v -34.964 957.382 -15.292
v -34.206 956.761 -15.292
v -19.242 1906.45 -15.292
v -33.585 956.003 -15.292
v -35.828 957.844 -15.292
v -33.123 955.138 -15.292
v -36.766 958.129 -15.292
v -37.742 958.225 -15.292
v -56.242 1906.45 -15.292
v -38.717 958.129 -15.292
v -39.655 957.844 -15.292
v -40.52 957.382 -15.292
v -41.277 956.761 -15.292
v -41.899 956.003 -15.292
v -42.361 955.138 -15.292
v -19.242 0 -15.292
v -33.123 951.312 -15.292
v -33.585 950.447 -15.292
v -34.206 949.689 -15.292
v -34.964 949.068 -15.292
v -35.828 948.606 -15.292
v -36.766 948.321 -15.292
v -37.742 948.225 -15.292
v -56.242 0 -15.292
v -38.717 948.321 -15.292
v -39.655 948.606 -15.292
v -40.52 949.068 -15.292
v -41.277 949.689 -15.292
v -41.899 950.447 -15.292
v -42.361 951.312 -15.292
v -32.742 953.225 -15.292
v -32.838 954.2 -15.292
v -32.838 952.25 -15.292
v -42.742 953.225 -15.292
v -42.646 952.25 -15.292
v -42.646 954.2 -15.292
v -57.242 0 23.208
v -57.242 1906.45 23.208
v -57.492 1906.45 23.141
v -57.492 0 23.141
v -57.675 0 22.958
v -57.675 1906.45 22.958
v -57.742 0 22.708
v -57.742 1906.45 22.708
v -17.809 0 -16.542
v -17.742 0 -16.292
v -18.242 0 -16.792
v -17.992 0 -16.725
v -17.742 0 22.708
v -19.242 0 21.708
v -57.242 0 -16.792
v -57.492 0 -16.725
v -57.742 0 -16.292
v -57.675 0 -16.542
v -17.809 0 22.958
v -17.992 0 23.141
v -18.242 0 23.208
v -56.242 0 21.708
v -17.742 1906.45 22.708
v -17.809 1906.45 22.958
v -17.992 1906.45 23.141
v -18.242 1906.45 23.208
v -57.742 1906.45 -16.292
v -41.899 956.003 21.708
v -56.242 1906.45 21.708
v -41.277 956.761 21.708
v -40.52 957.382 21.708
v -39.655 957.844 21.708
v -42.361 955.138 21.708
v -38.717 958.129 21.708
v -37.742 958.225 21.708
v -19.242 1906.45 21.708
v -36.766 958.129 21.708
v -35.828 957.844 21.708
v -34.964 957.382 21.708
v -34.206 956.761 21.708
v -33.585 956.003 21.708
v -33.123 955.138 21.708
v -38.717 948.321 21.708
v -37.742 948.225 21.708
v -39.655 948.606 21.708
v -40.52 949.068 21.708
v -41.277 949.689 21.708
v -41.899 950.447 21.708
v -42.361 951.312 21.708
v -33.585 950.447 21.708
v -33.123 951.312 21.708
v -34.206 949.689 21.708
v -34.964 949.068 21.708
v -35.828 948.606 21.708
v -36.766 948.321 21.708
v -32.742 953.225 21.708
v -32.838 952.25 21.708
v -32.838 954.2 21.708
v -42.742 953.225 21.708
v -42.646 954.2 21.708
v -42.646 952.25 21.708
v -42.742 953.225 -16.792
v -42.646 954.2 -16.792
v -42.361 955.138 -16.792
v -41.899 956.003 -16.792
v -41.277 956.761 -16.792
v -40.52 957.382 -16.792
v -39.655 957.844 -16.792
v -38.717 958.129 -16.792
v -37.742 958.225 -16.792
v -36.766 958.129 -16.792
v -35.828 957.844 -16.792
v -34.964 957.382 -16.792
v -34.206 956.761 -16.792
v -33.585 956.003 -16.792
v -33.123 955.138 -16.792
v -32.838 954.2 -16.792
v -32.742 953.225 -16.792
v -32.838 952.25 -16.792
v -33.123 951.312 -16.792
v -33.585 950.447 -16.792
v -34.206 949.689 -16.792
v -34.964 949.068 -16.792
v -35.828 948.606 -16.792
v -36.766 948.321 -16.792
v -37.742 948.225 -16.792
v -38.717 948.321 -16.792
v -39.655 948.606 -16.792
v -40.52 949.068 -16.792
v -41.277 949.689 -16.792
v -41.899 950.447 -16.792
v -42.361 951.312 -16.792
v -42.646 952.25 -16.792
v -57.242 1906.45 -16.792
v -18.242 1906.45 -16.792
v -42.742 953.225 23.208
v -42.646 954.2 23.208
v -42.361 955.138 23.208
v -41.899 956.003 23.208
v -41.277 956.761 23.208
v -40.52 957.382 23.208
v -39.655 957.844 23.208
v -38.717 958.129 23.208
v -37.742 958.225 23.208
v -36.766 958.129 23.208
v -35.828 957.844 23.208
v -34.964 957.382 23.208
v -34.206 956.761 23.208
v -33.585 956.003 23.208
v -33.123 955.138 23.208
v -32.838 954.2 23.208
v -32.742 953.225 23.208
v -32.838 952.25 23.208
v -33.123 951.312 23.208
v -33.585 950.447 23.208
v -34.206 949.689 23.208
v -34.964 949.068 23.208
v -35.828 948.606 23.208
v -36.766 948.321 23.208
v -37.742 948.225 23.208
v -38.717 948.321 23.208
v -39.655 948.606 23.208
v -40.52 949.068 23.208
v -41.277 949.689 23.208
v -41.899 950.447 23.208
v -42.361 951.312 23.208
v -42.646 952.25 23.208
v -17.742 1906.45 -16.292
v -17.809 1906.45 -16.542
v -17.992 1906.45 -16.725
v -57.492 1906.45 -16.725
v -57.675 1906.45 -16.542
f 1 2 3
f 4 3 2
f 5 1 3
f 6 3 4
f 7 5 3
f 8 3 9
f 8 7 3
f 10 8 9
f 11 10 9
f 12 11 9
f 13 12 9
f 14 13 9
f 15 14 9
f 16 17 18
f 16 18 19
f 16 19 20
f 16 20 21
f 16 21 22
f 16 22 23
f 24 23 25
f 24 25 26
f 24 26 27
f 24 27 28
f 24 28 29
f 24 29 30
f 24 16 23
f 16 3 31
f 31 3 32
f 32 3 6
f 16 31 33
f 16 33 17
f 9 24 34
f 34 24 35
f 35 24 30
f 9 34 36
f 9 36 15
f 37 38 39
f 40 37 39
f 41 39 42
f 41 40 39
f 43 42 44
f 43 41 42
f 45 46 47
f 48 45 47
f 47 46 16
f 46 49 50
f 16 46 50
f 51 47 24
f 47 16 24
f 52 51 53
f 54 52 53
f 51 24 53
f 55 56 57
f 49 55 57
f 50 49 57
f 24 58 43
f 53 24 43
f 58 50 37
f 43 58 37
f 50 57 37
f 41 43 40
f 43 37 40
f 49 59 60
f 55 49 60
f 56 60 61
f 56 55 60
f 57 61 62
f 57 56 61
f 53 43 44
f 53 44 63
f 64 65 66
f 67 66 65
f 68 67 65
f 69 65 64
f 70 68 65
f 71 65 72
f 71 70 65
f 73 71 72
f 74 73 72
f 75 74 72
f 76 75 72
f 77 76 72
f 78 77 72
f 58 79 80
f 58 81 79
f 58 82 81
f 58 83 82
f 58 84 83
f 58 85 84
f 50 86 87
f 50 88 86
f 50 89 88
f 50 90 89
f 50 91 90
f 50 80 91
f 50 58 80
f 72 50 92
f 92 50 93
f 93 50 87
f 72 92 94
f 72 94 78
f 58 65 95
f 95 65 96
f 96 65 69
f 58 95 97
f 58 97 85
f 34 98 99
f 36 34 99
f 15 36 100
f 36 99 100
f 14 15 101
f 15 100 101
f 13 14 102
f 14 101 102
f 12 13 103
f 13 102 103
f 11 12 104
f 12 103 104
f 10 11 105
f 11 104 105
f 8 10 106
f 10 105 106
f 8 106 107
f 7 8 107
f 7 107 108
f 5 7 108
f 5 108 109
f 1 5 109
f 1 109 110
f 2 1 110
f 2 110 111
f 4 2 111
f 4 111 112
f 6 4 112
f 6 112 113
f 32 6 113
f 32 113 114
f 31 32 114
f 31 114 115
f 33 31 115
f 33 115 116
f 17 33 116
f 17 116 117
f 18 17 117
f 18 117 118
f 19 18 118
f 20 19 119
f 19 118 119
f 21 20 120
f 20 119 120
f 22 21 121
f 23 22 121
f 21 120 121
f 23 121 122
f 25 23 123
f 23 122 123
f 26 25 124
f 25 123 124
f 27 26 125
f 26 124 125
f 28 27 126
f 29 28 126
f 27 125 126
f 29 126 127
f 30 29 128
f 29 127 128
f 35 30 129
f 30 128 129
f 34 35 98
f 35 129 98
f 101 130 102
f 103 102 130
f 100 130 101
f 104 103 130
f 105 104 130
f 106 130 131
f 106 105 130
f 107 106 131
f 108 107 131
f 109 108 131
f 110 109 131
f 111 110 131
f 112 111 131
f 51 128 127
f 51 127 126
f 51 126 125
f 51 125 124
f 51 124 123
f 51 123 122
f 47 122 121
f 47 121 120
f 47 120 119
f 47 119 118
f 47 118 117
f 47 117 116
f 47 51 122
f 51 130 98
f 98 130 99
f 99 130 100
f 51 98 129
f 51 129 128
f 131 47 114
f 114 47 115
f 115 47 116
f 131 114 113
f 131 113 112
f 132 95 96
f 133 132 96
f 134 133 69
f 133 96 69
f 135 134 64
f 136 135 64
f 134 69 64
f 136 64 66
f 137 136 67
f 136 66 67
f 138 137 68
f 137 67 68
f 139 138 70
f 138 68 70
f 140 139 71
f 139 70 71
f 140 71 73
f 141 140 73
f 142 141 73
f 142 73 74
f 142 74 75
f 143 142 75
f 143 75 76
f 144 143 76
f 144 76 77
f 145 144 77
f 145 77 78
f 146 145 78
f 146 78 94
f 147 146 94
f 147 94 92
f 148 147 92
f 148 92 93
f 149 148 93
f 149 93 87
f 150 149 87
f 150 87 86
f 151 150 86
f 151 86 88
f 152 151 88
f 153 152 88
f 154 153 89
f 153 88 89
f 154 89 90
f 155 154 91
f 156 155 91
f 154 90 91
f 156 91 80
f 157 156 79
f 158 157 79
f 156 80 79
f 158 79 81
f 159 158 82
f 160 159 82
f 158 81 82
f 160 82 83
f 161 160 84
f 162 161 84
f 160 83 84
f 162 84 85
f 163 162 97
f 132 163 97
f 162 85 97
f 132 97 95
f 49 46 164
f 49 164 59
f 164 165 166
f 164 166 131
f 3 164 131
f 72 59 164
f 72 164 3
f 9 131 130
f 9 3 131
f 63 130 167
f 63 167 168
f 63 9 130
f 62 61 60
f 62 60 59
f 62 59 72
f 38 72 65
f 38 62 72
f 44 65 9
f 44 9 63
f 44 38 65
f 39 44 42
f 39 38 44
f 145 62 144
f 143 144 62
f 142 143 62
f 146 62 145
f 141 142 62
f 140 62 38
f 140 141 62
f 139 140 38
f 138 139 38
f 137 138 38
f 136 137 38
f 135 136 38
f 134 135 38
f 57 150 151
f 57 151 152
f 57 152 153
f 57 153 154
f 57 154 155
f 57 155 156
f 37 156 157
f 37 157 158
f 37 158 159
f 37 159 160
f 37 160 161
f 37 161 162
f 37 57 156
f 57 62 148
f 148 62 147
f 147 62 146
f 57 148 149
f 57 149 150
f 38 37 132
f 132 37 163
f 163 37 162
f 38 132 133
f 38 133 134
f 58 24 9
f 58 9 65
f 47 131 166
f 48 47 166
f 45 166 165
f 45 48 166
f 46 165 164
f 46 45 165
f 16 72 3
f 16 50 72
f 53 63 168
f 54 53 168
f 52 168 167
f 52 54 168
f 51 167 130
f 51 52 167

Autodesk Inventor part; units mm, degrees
ref_plane "YZ Plane" through (0, 0, 0) normal (1, 0, 0) x (0, 1, 0)
ref_plane "XZ Plane" through (0, 0, 0) normal (0, 1, 0) x (-1, 0, 0)
ref_plane "XY Plane" through (0, 0, 0) normal (0, 0, 1) x (1, 0, 0)
sketch "Sketch1" plane through (0, 0, 0) normal (0, 1, 0) x (-1, 0, 0)
  line L0 (18.2419, 23.2079) -> (57.2419, 23.2079)
  line L1 (57.7419, 22.7079) -> (57.7419, -16.2921)
  line L2 (57.2419, -16.7921) -> (18.2419, -16.7921)
  line L3 (17.7419, -16.2921) -> (17.7419, 22.7079)
  line L4 (56.2419, 21.7079) -> (19.2419, 21.7079)
  line L5 (19.2419, 21.7079) -> (19.2419, -15.2921)
  line L6 (19.2419, -15.2921) -> (56.2419, -15.2921)
  line L7 (56.2419, -15.2921) -> (56.2419, 21.7079)
  arc A0 (18.2419, 23.2079) -> (17.7419, 22.7079) centre (18.2419, 22.7079) ccw
  arc A1 (57.7419, 22.7079) -> (57.2419, 23.2079) centre (57.2419, 22.7079) ccw
  arc A2 (57.2419, -16.7921) -> (57.7419, -16.2921) centre (57.2419, -16.2921) ccw
  arc A3 (17.7419, -16.2921) -> (18.2419, -16.7921) centre (18.2419, -16.2921) ccw
  point P0 (0, 0)
  point P1 (17.7419, 23.2079)
  point P2 (57.7419, 23.2079)
  point P3 (57.7419, -16.7921)
  dimension "d0" = 40
  dimension "d1" = 40
  dimension "d2" = 1.5
  dimension "d3" = 0.5
extrude "Extrusion1" add sketch "Sketch1" along normal blind 1906.45
sketch "Sketch2" plane through (-18.2419, 0, -16.7921) normal (0, 0, -1) x (-1, 0, 0)
  line L0 (0, 1906.45) -> (39, 1906.45) projected
  line L1 (19.5, 1906.45) -> (19.5, 0)
  line L2 (39, 0) -> (0, 0) projected
  circle A0 centre (19.5, 953.225) radius 5
  point P0 (-18.2419, 0)
  dimension "d6" = 10
extrude "Extrusion2" cut sketch "Sketch2" against normal blind 10
extrude "Extrusion3" cut sketch "Sketch2" against normal blind 231.3
properties part number "Metalon_Base_1"
